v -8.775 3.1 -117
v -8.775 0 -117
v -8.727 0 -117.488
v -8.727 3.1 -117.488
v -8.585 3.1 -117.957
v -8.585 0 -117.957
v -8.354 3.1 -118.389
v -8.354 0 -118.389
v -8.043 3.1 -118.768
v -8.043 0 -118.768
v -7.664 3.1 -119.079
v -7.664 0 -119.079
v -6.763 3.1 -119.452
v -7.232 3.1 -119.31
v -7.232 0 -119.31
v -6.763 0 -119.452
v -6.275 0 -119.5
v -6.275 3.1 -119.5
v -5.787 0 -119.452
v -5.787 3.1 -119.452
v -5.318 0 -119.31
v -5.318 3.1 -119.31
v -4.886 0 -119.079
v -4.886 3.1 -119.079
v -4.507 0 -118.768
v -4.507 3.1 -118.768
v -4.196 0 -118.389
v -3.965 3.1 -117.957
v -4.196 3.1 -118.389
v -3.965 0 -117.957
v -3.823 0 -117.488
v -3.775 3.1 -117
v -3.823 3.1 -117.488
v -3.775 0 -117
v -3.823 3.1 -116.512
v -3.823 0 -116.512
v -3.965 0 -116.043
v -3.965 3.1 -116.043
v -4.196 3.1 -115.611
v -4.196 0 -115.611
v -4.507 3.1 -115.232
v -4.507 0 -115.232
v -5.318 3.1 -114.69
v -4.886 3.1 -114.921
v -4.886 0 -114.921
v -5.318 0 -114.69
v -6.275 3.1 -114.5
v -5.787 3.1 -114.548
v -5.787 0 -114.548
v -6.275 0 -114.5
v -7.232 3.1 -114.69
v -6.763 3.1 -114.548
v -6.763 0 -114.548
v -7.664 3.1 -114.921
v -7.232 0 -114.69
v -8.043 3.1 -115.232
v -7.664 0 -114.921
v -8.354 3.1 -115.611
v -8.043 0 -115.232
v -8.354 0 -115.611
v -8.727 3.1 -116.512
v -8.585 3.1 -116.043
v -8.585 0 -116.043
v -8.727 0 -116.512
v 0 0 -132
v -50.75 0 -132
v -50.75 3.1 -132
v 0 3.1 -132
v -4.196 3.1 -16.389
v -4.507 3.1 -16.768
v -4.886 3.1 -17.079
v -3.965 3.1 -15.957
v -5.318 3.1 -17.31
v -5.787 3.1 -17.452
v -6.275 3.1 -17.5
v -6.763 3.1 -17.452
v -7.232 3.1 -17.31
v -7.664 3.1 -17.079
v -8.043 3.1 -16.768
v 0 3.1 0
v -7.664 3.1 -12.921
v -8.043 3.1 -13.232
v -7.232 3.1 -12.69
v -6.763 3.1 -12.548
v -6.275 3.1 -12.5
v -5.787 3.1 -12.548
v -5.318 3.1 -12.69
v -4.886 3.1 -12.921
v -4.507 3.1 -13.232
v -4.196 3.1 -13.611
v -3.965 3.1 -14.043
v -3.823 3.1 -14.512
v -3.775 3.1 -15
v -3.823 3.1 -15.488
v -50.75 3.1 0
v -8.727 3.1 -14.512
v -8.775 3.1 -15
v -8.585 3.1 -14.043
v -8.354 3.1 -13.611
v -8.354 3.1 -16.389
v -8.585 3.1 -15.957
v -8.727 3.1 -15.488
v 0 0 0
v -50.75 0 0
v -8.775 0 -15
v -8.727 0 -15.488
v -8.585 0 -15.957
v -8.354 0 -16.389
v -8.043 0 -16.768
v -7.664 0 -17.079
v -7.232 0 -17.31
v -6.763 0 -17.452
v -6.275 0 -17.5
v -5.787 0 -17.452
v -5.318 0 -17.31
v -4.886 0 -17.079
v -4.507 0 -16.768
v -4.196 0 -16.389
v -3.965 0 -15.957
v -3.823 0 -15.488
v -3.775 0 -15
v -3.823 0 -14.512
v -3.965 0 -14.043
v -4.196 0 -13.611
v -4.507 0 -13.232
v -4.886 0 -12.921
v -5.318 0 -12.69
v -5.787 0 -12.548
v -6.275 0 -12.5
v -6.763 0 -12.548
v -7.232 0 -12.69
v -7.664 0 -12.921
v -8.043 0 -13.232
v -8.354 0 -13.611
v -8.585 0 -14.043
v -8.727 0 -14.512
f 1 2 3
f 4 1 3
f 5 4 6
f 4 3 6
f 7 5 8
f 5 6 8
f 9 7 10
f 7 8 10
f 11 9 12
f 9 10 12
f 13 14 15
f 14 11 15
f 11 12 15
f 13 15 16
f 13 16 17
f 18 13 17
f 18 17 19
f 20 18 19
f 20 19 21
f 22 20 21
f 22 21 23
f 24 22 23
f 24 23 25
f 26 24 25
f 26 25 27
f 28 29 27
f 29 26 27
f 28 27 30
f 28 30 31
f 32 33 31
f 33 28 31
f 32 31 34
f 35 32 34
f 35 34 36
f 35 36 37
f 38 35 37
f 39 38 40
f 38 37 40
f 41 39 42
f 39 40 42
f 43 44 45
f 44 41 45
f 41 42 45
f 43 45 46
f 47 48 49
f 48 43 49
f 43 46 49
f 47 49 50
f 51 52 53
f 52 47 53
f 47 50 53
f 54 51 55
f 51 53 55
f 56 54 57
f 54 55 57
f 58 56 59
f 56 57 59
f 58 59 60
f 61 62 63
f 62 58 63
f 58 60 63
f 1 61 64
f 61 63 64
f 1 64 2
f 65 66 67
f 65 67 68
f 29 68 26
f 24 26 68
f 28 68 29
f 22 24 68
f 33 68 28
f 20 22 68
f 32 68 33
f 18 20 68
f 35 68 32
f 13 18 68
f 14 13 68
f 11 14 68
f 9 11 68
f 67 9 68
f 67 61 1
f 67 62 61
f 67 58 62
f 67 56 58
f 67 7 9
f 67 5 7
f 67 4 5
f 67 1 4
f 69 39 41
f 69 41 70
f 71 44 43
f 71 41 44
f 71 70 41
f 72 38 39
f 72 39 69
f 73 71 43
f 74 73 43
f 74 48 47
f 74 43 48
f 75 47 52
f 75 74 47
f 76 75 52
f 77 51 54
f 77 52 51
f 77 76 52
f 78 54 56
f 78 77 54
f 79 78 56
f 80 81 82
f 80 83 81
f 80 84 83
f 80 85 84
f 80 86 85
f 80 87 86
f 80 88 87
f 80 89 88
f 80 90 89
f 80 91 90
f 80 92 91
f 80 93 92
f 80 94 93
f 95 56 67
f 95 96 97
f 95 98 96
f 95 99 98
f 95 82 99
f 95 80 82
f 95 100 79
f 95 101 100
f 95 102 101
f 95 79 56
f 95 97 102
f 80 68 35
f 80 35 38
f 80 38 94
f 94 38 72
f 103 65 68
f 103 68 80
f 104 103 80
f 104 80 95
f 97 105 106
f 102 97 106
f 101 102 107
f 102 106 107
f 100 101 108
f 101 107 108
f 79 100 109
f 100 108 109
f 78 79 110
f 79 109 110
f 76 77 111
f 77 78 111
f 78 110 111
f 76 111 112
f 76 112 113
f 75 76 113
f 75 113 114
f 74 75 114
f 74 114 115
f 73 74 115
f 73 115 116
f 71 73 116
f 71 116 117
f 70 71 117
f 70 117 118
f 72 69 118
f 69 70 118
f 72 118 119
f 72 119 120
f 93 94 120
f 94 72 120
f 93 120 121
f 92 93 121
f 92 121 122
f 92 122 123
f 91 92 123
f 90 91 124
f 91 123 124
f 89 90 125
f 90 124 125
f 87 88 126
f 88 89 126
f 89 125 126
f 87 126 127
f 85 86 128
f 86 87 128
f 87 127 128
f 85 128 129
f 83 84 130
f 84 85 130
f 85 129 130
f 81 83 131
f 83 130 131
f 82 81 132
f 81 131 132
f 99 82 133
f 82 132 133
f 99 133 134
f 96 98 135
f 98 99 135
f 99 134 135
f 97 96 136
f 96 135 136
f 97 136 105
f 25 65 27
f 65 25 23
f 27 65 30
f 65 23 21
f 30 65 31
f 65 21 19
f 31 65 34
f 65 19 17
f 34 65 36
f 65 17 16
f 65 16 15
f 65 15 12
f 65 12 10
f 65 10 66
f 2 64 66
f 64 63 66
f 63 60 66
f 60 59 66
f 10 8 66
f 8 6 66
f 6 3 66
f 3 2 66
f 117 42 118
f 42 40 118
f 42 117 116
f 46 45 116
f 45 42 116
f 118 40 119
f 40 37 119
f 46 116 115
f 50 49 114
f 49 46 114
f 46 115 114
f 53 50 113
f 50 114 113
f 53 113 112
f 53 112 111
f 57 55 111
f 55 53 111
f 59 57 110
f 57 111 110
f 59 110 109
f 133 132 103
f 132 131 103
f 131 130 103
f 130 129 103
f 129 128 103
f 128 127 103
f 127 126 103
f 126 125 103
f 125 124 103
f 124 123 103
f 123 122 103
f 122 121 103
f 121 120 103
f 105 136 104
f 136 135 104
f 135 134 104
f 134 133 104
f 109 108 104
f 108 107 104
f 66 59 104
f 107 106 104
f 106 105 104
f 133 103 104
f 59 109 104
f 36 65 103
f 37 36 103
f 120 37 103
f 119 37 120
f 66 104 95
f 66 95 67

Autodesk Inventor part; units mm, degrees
ref_plane "YZ Plane" through (0, 0, 0) normal (1, 0, 0) x (0, 1, 0)
ref_plane "XZ Plane" through (0, 0, 0) normal (0, 1, 0) x (-1, 0, 0)
ref_plane "XY Plane" through (0, 0, 0) normal (0, 0, 1) x (1, 0, 0)
sketch "Sketch1" plane through (0, 0, 0) normal (0, 1, 0) x (-1, 0, 0)
  line L0 (0, 0) -> (50.75, 0)
  line L1 (50.75, 0) -> (50.75, -132)
  line L2 (50.75, -132) -> (0, -132)
  line L3 (0, -132) -> (0, 0)
  circle A0 centre (6.275, -15) radius 2.5
  circle A1 centre (6.275, -117) radius 2.5
  dimension "d0" = 50.75
  dimension "d1" = 132
  dimension "d4" = 5
  dimension "d5" = 5
  dimension "d6" = 6.275
  dimension "d7" = 6.275
  dimension "d8" = 15
  dimension "d9" = 15
extrude "Extrusion1" add sketch "Sketch1" along normal blind 3.1
properties part number "LoadCellPlate" material "Steel, Mild"
